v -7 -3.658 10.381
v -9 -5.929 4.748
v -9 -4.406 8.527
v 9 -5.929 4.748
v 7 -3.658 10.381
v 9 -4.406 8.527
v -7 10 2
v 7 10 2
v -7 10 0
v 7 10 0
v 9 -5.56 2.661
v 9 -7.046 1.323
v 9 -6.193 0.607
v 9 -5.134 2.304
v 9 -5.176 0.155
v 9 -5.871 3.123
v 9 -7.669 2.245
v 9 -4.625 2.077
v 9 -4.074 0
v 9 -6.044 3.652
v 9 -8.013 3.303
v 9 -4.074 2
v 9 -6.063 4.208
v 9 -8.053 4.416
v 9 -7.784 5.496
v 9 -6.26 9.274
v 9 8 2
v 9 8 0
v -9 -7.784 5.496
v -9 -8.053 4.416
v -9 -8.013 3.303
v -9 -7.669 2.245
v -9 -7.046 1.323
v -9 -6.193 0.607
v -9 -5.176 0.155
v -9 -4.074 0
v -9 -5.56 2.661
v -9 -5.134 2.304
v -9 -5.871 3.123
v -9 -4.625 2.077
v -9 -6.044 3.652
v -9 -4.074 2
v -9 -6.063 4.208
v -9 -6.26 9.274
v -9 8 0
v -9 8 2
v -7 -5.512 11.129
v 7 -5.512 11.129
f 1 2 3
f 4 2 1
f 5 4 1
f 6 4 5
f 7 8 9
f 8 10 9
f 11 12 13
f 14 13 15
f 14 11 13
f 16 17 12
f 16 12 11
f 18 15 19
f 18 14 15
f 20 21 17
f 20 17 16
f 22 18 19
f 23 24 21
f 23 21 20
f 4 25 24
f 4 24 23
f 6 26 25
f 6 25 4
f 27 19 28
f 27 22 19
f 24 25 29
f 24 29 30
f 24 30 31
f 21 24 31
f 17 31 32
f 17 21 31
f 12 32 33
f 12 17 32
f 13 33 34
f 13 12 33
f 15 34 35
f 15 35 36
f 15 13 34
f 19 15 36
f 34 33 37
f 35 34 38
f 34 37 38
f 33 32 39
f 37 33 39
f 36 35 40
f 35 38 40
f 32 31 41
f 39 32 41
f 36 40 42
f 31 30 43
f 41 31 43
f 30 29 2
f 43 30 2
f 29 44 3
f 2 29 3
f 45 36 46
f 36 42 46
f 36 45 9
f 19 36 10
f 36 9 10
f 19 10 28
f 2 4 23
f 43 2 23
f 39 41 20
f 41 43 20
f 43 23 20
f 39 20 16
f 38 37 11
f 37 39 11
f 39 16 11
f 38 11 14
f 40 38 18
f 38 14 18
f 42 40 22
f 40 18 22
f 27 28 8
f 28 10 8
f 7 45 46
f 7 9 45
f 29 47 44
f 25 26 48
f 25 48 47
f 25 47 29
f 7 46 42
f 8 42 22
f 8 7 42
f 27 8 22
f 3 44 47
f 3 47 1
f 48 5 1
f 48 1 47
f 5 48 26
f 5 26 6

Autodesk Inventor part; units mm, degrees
ref_plane "YZ Plane" through (0, 0, 0) normal (1, 0, 0) x (0, 1, 0)
ref_plane "XZ Plane" through (0, 0, 0) normal (0, 1, 0) x (-1, 0, 0)
ref_plane "XY Plane" through (0, 0, 0) normal (0, 0, 1) x (1, 0, 0)
sketch "Sketch1" plane through (0, 0, 0) normal (0, 0, 1) x (1, 0, 0)
  line L0 (-9, -10) -> (9, -10)
  line L1 (9, -10) -> (9, 10)
  line L2 (9, 10) -> (-9, 10)
  line L3 (-9, 10) -> (-9, -10)
  line L4 (-9, -10) -> (9, 10) construction
  line L5 (9, -10) -> (-9, 10) construction
  point P0 (0, 0)
  dimension "d0" = 18
  dimension "d1" = 20
extrude "Plate1" add sketch "Sketch1" along normal blind 2
sketch "Sketch2" plane through (9, -8.1451, -0.7479) normal (0, -0.9274452, 0.3739592) x (1, 0, 0)
  line L0 (-18, 0) -> (0, 0)
  line L1 (0, 0) -> (0, 12)
  line L2 (0, 12) -> (-18, 12)
  line L3 (-18, 12) -> (-18, 0)
edge flange "Flange1" height 12 angle 111.96 thickness 2 bend radius 2 thickness toward (0, -0.9274452, 0.3739592) relief tear relief width 2 relief depth 1 edges at (0, -10, 2) wall of the first edge with corners at (-9, -8.1451, -0.7479) (9, -8.1451, -0.7479) (9, -3.6576, 10.3814) (-9, -3.6576, 10.3814)
bend "Bend1"
corner "Corner1"
chamfer "Corner Chamfer1" distance 2 angle 45 4 edges at (-9, 10, 1) (9, 10, 1) (-9, -4.585, 10.7554) (9, -4.585, 10.7554)
equation "\"d3\" = BendReliefWidth"
equation "\"d4\" = BendReliefDepth"
equation "\"d5\" = MinimumRemnant"
equation "\"d6\" = BendRadius"
equation "\"d9\" = BendRadius"
equation "\"d10\" = CornerReliefSize"
equation "\"d11\" = GapSize"
equation "\"d12\" = JacobiRadiusSize"
equation "\"BendRadius\" = Thickness"
equation "\"BendReliefWidth\" = Thickness"
equation "\"BendReliefDepth\" = 0.5 * Thickness"
equation "\"CornerReliefSize\" = 4 * Thickness"
equation "\"MinimumRemnant\" = 2 * Thickness"
equation "\"TransitionRadius\" = BendRadius"
equation "\"JacobiRadiusSize\" = BendRadius"
equation "\"GapSize\" = Thickness"
equation "\"d2\" = BendRadius"
equation "\"Thickness\" = 2"
